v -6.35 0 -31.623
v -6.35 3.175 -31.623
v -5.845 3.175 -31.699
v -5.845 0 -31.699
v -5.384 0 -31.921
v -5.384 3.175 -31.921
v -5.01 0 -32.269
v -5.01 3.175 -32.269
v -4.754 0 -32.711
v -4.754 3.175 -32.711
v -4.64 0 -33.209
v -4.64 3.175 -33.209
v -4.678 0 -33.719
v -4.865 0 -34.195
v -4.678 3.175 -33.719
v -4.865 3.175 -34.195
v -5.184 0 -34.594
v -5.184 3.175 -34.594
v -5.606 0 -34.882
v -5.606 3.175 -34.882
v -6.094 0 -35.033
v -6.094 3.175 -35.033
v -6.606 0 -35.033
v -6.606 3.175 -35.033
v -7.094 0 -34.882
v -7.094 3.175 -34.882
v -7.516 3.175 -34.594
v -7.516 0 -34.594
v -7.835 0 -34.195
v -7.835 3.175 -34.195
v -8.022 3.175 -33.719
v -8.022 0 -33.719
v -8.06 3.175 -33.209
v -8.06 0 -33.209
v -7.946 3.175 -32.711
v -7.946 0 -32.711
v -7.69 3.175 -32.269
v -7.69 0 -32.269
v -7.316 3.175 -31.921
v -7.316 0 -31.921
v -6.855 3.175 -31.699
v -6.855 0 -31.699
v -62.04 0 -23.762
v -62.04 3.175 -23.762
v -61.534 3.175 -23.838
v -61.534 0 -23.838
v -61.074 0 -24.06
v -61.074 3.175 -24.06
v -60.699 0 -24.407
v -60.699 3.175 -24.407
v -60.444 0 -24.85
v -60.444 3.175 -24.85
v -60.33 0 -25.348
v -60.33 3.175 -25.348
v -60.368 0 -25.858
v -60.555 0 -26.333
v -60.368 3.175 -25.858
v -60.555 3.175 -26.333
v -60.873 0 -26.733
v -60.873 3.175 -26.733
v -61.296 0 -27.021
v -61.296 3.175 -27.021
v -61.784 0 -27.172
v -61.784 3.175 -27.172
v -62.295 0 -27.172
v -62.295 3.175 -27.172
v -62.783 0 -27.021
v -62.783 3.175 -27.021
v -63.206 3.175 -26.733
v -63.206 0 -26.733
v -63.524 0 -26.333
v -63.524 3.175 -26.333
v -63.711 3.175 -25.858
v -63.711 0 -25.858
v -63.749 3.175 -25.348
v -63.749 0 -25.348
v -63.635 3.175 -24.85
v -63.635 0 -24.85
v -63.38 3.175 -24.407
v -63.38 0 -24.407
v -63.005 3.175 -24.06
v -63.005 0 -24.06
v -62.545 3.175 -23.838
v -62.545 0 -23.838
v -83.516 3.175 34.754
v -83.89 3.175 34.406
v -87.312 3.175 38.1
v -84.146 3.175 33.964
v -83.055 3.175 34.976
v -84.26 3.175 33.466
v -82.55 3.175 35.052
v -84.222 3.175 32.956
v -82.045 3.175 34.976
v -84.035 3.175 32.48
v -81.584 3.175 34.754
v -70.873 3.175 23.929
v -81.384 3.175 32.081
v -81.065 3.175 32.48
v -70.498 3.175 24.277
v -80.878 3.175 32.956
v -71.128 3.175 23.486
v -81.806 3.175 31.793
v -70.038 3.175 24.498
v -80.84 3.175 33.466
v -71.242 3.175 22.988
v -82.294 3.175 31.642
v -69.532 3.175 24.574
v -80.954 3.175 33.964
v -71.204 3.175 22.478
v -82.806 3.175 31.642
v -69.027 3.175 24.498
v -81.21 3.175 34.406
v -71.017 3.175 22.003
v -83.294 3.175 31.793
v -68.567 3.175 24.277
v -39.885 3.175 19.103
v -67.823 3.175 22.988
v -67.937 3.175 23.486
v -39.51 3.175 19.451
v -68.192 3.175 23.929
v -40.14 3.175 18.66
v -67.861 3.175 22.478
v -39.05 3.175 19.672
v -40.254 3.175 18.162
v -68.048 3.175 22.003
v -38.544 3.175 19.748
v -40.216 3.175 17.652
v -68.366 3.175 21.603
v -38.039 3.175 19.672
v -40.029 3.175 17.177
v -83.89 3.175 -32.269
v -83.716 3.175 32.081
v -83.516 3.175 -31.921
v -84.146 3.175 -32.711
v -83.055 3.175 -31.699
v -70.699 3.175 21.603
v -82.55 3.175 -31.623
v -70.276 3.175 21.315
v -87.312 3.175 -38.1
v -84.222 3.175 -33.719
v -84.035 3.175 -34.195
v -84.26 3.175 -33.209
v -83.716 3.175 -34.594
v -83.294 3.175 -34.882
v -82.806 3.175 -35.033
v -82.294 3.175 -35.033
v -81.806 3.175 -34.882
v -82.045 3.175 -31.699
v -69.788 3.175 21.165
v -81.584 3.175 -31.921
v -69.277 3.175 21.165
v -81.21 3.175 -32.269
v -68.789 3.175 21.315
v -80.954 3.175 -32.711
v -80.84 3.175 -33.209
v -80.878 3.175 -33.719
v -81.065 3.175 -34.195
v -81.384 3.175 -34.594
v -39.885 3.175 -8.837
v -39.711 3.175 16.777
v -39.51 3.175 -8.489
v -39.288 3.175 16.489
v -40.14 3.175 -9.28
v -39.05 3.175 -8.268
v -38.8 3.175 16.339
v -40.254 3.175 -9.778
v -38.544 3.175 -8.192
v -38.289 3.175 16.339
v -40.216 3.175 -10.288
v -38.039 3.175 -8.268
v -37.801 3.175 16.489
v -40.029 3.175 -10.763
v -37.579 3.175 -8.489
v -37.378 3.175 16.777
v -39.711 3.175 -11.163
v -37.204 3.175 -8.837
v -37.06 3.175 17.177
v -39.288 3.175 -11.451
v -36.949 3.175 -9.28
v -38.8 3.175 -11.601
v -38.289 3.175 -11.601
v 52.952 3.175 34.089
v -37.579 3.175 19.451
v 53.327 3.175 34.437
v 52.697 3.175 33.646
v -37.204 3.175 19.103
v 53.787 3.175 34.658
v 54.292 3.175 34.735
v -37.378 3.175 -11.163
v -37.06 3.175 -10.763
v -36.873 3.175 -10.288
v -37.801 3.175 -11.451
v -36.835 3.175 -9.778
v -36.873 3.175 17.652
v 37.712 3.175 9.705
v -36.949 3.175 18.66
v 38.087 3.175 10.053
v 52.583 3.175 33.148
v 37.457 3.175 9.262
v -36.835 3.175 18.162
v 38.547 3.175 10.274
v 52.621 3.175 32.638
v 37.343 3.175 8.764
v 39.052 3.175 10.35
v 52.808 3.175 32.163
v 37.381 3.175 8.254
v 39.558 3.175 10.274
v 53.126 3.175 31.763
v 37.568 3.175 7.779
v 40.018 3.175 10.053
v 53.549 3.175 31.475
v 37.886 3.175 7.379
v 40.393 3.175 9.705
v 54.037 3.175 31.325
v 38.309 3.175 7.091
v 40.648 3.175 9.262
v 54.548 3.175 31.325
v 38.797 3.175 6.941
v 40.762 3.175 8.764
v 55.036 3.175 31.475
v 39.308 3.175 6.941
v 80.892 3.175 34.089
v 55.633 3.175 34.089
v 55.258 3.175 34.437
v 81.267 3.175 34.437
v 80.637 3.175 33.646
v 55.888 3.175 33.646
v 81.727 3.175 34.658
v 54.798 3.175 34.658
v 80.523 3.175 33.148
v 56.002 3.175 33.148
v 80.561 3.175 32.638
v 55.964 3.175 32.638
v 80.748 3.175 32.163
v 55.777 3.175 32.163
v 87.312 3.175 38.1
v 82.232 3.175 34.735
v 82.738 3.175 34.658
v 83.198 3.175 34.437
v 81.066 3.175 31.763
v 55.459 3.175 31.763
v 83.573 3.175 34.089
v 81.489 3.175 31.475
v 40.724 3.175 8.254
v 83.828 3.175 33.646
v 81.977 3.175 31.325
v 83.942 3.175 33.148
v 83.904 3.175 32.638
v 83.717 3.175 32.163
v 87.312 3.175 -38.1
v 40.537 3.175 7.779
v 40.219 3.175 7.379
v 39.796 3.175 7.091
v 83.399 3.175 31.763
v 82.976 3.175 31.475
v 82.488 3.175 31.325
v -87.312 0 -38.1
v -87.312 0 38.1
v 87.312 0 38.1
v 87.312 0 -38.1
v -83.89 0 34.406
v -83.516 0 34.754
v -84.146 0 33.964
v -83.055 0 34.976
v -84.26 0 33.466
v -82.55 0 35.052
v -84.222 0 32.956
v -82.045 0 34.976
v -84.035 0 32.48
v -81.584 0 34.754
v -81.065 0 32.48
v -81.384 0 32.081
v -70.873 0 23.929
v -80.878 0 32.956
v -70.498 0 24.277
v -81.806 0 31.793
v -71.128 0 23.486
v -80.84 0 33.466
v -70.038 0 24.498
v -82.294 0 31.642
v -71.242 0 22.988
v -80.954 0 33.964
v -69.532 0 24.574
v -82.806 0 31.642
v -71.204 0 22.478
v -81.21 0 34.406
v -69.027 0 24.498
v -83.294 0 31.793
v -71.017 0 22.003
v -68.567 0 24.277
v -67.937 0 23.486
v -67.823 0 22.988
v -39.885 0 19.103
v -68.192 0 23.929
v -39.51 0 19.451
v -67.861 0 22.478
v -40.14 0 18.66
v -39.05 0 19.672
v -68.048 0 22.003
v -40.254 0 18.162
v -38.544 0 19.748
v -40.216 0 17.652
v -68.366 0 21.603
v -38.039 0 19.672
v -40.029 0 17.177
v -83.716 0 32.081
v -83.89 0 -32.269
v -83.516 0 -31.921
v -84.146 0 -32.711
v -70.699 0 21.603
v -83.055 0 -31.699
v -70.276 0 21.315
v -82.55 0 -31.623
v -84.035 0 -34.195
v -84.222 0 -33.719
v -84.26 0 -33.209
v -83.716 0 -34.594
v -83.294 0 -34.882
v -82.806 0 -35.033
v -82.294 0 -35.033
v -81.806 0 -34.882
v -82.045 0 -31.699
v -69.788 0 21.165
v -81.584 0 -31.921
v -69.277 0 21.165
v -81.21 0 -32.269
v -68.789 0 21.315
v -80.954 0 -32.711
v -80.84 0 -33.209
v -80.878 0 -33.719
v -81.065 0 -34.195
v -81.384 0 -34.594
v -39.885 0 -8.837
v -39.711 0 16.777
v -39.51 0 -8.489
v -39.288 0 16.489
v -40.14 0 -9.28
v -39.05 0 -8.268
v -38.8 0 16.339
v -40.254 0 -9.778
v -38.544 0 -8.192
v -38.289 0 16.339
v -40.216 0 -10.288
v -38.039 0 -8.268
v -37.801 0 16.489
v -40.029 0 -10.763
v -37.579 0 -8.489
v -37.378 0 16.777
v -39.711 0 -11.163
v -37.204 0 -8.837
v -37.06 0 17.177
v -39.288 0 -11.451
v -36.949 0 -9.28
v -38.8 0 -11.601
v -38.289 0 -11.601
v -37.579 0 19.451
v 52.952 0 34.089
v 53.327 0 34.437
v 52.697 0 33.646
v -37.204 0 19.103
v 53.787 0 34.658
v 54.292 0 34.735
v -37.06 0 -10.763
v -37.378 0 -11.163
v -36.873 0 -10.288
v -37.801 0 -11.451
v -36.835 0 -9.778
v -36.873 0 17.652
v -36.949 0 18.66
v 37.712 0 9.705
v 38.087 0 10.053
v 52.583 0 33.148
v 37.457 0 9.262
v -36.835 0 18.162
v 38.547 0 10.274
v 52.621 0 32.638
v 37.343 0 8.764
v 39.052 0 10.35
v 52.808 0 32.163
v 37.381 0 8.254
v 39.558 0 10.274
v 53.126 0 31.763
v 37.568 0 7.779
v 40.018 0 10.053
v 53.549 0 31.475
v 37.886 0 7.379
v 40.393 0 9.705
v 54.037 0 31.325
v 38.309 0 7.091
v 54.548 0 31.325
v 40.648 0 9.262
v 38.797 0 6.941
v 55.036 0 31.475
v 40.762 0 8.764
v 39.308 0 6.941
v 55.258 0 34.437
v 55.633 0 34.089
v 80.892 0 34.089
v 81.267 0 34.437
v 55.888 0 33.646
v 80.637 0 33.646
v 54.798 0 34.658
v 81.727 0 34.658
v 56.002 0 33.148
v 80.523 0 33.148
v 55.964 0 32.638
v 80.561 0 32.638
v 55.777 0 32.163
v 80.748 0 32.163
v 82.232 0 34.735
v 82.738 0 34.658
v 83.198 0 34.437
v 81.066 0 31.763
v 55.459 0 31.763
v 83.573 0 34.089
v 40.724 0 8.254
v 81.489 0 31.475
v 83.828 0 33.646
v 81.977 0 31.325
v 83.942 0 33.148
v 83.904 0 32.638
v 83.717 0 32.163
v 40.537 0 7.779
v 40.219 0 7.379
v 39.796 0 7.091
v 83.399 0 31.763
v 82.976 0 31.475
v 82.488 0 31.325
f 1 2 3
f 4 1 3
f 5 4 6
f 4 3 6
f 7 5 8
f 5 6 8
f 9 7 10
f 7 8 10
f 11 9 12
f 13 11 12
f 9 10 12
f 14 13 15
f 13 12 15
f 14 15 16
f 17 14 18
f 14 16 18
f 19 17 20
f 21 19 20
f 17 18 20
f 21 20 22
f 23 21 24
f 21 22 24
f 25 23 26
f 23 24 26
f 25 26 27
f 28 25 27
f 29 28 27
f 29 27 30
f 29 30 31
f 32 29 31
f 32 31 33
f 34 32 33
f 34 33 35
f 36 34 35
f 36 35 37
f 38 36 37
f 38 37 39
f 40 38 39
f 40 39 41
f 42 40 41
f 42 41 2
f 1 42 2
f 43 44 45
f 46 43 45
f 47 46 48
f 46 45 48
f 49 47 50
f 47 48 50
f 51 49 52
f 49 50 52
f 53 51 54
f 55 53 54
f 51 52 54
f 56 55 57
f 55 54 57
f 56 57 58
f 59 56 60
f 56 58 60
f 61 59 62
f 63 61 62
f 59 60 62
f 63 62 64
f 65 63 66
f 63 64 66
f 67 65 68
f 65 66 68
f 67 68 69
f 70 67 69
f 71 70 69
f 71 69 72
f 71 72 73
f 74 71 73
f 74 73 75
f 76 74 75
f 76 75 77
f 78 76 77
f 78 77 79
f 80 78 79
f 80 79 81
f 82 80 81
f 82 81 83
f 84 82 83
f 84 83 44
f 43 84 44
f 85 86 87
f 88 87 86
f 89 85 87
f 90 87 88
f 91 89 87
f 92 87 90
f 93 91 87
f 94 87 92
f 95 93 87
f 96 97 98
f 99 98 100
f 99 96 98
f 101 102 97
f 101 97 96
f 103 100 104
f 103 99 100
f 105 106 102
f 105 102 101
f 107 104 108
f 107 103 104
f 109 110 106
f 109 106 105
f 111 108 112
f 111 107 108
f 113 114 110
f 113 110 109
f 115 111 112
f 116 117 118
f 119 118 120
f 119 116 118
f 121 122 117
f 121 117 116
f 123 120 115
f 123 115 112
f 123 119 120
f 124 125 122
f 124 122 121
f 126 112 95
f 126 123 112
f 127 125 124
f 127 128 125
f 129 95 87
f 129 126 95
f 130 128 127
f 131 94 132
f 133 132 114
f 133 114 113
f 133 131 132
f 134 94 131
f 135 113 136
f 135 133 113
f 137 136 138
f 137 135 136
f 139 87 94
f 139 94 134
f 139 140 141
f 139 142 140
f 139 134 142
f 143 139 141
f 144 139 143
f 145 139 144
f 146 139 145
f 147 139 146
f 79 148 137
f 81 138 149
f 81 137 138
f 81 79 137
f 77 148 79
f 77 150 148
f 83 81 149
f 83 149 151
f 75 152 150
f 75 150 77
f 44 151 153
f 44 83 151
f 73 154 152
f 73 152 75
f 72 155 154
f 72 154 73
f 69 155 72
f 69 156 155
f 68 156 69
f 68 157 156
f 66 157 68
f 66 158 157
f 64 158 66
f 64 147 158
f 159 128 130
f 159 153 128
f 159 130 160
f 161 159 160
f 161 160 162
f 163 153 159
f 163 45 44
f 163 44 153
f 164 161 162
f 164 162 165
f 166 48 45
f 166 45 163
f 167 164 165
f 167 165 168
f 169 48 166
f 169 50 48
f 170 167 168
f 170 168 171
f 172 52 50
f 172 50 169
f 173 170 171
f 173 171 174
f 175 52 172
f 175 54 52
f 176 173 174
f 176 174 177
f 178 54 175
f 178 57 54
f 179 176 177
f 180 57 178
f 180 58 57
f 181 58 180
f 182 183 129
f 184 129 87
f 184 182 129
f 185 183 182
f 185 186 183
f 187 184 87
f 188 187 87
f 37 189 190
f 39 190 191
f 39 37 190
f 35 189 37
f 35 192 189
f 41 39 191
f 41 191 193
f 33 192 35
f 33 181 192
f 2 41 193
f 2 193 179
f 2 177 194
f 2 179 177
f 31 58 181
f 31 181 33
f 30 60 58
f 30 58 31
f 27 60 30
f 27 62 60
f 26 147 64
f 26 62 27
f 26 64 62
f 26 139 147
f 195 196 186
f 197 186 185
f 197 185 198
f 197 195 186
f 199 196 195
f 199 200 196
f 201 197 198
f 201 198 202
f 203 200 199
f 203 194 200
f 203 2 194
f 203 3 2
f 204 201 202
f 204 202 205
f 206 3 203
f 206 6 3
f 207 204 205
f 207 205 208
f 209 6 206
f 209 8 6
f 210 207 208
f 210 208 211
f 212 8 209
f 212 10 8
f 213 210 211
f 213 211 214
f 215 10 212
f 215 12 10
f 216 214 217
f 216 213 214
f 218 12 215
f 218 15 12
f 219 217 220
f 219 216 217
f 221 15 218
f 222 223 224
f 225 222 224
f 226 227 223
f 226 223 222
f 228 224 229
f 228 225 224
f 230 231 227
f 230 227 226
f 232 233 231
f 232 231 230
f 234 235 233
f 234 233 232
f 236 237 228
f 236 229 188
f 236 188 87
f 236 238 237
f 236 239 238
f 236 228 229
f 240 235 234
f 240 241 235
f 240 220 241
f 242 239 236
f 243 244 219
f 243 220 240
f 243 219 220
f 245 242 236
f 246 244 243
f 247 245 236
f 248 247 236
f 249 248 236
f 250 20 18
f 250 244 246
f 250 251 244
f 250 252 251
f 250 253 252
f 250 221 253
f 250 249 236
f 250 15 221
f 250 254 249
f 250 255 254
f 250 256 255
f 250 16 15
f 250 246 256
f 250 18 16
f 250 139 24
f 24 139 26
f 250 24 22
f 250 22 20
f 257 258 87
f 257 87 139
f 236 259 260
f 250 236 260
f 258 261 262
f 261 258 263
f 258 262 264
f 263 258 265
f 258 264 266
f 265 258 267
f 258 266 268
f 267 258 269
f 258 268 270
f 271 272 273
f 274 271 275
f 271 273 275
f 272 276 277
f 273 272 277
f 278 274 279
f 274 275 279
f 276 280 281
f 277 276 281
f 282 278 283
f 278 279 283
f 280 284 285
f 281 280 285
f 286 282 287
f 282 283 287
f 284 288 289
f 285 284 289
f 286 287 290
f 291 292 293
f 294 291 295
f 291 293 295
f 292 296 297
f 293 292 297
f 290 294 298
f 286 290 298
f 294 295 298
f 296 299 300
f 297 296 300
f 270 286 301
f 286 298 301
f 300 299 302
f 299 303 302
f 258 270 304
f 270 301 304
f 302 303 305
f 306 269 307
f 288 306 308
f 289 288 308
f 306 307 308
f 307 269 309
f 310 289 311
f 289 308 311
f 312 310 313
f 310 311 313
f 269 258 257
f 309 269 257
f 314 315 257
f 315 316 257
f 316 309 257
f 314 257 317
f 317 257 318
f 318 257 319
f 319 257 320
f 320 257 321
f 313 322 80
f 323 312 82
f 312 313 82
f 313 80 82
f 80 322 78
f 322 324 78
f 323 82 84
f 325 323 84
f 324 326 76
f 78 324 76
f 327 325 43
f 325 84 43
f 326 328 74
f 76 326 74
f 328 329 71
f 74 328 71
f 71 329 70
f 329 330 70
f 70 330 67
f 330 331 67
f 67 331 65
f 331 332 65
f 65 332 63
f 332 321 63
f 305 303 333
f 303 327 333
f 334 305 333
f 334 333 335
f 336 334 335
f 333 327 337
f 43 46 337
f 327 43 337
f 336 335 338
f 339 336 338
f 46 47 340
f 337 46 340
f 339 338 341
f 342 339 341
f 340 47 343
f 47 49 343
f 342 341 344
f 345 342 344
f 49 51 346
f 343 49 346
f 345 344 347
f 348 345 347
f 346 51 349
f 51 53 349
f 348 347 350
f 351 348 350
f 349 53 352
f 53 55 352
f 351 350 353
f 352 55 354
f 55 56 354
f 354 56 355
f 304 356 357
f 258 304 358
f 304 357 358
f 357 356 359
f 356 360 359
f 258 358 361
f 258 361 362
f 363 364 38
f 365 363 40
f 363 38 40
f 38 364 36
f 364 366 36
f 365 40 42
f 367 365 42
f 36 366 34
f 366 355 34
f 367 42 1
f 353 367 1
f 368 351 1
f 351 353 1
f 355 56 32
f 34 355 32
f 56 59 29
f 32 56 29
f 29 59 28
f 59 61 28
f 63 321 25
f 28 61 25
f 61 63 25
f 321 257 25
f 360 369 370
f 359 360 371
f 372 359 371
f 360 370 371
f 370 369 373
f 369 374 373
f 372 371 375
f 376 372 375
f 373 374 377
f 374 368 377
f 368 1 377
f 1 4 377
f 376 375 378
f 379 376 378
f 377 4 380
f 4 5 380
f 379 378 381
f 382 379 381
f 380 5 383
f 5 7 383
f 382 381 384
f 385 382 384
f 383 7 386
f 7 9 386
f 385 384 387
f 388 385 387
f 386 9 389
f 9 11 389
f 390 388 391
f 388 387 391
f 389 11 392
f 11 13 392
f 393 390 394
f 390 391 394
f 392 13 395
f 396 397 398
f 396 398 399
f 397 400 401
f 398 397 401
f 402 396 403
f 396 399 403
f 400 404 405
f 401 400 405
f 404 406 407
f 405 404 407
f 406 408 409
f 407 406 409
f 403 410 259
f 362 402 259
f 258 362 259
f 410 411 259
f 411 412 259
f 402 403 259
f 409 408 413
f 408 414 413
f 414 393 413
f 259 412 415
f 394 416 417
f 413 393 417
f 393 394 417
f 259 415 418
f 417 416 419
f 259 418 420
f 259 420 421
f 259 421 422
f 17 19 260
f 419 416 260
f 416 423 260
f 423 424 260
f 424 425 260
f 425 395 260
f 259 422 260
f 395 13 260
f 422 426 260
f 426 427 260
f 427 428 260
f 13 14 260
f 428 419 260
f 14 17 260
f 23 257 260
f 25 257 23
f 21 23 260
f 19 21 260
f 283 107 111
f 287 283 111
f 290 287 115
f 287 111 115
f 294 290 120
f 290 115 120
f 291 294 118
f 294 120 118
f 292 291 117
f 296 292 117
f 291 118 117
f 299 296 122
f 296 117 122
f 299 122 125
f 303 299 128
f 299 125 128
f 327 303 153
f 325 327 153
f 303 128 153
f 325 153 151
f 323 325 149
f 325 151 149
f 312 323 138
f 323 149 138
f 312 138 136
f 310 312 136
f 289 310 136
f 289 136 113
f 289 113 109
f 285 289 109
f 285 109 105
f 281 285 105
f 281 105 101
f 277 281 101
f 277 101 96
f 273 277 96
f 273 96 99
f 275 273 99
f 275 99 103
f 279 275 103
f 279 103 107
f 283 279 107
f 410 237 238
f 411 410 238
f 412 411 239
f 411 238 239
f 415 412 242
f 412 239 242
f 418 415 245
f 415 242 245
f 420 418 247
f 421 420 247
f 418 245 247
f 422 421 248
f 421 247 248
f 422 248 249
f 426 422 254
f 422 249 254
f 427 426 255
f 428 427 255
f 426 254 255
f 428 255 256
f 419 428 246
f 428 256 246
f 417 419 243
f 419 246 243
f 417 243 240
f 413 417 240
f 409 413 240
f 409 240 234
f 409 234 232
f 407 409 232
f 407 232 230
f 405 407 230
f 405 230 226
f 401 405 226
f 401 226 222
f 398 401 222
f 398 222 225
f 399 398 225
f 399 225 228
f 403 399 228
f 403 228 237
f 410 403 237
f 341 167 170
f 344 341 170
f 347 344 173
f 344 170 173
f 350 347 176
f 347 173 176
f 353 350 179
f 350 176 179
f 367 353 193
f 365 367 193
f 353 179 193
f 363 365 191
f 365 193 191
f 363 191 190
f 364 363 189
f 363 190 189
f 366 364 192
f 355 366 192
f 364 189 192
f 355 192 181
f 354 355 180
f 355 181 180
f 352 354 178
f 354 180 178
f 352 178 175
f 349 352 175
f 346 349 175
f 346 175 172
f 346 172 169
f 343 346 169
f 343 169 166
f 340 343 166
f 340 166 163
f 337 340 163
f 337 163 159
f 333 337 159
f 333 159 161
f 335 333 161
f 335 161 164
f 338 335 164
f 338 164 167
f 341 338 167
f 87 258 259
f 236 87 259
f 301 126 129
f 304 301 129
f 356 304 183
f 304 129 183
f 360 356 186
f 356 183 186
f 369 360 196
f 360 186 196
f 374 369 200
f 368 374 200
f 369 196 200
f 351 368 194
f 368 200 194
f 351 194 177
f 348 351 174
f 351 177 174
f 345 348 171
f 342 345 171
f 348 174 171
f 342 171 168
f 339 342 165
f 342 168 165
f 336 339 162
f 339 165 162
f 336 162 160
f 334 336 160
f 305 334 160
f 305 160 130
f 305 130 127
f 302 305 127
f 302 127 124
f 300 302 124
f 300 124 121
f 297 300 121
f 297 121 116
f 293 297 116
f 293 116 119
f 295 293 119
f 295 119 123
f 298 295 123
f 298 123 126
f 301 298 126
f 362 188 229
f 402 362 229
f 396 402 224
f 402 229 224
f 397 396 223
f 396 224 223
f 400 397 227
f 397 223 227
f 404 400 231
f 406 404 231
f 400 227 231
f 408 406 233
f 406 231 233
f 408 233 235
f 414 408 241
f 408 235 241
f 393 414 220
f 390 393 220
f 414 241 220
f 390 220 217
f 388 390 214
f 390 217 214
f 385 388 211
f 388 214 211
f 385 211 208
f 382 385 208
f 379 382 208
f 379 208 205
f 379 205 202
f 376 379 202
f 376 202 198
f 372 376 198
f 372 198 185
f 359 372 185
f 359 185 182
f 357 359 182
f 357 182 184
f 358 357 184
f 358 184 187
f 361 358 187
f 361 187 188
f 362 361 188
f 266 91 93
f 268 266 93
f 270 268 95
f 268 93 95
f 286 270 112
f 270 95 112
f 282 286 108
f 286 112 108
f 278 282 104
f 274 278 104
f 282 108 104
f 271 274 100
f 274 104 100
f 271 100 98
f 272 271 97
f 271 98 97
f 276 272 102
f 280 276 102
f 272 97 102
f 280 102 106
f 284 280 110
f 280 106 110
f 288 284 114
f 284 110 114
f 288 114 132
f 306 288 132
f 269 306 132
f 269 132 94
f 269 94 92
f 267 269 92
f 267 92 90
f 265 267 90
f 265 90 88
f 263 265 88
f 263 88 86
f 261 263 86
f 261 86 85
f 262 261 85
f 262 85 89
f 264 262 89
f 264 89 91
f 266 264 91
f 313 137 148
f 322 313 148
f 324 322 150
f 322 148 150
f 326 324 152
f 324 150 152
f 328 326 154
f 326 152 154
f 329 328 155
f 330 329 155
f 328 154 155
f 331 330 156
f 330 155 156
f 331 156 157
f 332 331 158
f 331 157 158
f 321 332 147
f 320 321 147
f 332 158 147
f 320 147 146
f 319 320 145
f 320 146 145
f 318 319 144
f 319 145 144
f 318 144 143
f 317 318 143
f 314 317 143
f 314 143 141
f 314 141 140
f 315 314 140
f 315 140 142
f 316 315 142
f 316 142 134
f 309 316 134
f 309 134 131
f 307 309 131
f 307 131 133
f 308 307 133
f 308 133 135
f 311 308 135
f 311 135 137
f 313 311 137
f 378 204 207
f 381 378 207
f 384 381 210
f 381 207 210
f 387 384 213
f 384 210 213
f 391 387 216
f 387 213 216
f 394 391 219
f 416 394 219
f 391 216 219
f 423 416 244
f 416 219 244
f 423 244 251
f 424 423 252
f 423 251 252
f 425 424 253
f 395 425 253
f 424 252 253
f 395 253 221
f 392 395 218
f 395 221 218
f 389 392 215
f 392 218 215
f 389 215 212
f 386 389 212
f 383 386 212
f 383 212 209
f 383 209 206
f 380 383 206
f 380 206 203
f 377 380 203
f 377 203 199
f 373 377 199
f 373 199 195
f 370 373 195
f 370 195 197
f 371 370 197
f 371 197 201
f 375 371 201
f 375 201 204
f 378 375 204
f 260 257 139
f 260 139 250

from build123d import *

# Parameters (mm, degrees)
BASE_SKETCH_W                              = 174.625
BASE_SKETCH_H                              = 76.2
BASE_PLATE_DEPTH                           = 3.175
F_4_40_GUIDE_RAIL_HOLES_REACH              = 97.316
F_4_40_HOLE_PATTERN_SKETCH_GUIDE_RAIL_R    = 1.7145
F_4_40_ARDUINO_HOLES_REACH                 = 97.316
F_4_40_HOLE_PATTERN_SKETCH_ARDUINO_HOLES_R = 1.7145
F_4_40_IMU_MOUNT_HOLES_REACH               = 97.316
F_4_40_HOLE_PATTERN_SKETCH_IMU_MOUNT_R     = 1.7145


with BuildPart() as part:
    # Base Sketch → Base Plate (new body)
    with BuildSketch(Plane(origin=(0, 0, 0), x_dir=(1, 0, 0), z_dir=(0, 1, 0))):
        Rectangle(BASE_SKETCH_W, BASE_SKETCH_H)
    extrude(amount=BASE_PLATE_DEPTH)

    # 4-40 Hole Pattern Sketch (Guide Rail) → 4-40 Guide Rail Holes (cut, up to next)
    with BuildSketch(Plane(origin=(0, 3.175, 0), x_dir=(1, 0, 0), z_dir=(0, 1, 0)), mode=Mode.PRIVATE) as f_4_40_guide_rail_holes_sk1:
        with Locations(Location((-82.55, 33.3375, 0), (0, 0, 270))):
            Circle(F_4_40_HOLE_PATTERN_SKETCH_GUIDE_RAIL_R)
    f_4_40_guide_rail_holes_tool1 = extrude(f_4_40_guide_rail_holes_sk1.sketch, amount=-F_4_40_GUIDE_RAIL_HOLES_REACH, mode=Mode.PRIVATE) & part.part
    # 4-40 Hole Pattern Sketch (Guide Rail) → 4-40 Guide Rail Holes (cut, up to next)
    with BuildSketch(Plane(origin=(0, 3.175, 0), x_dir=(1, 0, 0), z_dir=(0, 1, 0)), mode=Mode.PRIVATE) as f_4_40_guide_rail_holes_sk2:
        with Locations(Location((-82.55, -33.3375, 0), (0, 0, 270))):
            Circle(F_4_40_HOLE_PATTERN_SKETCH_GUIDE_RAIL_R)
    f_4_40_guide_rail_holes_tool2 = extrude(f_4_40_guide_rail_holes_sk2.sketch, amount=-F_4_40_GUIDE_RAIL_HOLES_REACH, mode=Mode.PRIVATE) & part.part
    # 4-40 Hole Pattern Sketch (Guide Rail) → 4-40 Guide Rail Holes (cut, up to next)
    with BuildSketch(Plane(origin=(0, 3.175, 0), x_dir=(1, 0, 0), z_dir=(0, 1, 0)), mode=Mode.PRIVATE) as f_4_40_guide_rail_holes_sk3:
        with Locations(Location((-6.35, 33.3375, 0), (0, 0, 270))):
            Circle(F_4_40_HOLE_PATTERN_SKETCH_GUIDE_RAIL_R)
    f_4_40_guide_rail_holes_tool3 = extrude(f_4_40_guide_rail_holes_sk3.sketch, amount=-F_4_40_GUIDE_RAIL_HOLES_REACH, mode=Mode.PRIVATE) & part.part
    add(f_4_40_guide_rail_holes_tool1.solids().sort_by_distance((-82.55, 3.175, -33.3375))[0], mode=Mode.SUBTRACT)
    add(f_4_40_guide_rail_holes_tool2.solids().sort_by_distance((-82.55, 3.175, 33.3375))[0], mode=Mode.SUBTRACT)
    add(f_4_40_guide_rail_holes_tool3.solids().sort_by_distance((-6.35, 3.175, -33.3375))[0], mode=Mode.SUBTRACT)

    # 4-40 Hole Pattern Sketch (Arduino Holes) → 4-40 Arduino Holes (cut, up to next)
    with BuildSketch(Plane(origin=(0, 3.175, 0), x_dir=(1, 0, 0), z_dir=(0, 1, 0)), mode=Mode.PRIVATE) as f_4_40_arduino_holes_sk1:
        with Locations(Location((-38.5445, -18.034, 0), (0, 0, 270))):
            Circle(F_4_40_HOLE_PATTERN_SKETCH_ARDUINO_HOLES_R)
    f_4_40_arduino_holes_tool1 = extrude(f_4_40_arduino_holes_sk1.sketch, amount=-F_4_40_ARDUINO_HOLES_REACH, mode=Mode.PRIVATE) & part.part
    # 4-40 Hole Pattern Sketch (Arduino Holes) → 4-40 Arduino Holes (cut, up to next)
    with BuildSketch(Plane(origin=(0, 3.175, 0), x_dir=(1, 0, 0), z_dir=(0, 1, 0)), mode=Mode.PRIVATE) as f_4_40_arduino_holes_sk2:
        with Locations(Location((-38.5445, 9.906, 0), (0, 0, 270))):
            Circle(F_4_40_HOLE_PATTERN_SKETCH_ARDUINO_HOLES_R)
    f_4_40_arduino_holes_tool2 = extrude(f_4_40_arduino_holes_sk2.sketch, amount=-F_4_40_ARDUINO_HOLES_REACH, mode=Mode.PRIVATE) & part.part
    # 4-40 Hole Pattern Sketch (Arduino Holes) → 4-40 Arduino Holes (cut, up to next)
    with BuildSketch(Plane(origin=(0, 3.175, 0), x_dir=(1, 0, 0), z_dir=(0, 1, 0)), mode=Mode.PRIVATE) as f_4_40_arduino_holes_sk3:
        with Locations(Location((-69.5325, -22.86, 0), (0, 0, 270))):
            Circle(F_4_40_HOLE_PATTERN_SKETCH_ARDUINO_HOLES_R)
    f_4_40_arduino_holes_tool3 = extrude(f_4_40_arduino_holes_sk3.sketch, amount=-F_4_40_ARDUINO_HOLES_REACH, mode=Mode.PRIVATE) & part.part
    # 4-40 Hole Pattern Sketch (Arduino Holes) → 4-40 Arduino Holes (cut, up to next)
    with BuildSketch(Plane(origin=(0, 3.175, 0), x_dir=(1, 0, 0), z_dir=(0, 1, 0)), mode=Mode.PRIVATE) as f_4_40_arduino_holes_sk4:
        with Locations(Location((-62.0395, 25.4762, 0), (0, 0, 270))):
            Circle(F_4_40_HOLE_PATTERN_SKETCH_ARDUINO_HOLES_R)
    f_4_40_arduino_holes_tool4 = extrude(f_4_40_arduino_holes_sk4.sketch, amount=-F_4_40_ARDUINO_HOLES_REACH, mode=Mode.PRIVATE) & part.part
    add(f_4_40_arduino_holes_tool1.solids().sort_by_distance((-38.5445, 3.175, 18.034))[0], mode=Mode.SUBTRACT)
    add(f_4_40_arduino_holes_tool2.solids().sort_by_distance((-38.5445, 3.175, -9.906))[0], mode=Mode.SUBTRACT)
    add(f_4_40_arduino_holes_tool3.solids().sort_by_distance((-69.5325, 3.175, 22.86))[0], mode=Mode.SUBTRACT)
    add(f_4_40_arduino_holes_tool4.solids().sort_by_distance((-62.0395, 3.175, -25.4762))[0], mode=Mode.SUBTRACT)

    # 4-40 Hole Pattern Sketch (IMU Mount) → 4-40 IMU Mount Holes (cut, up to next)
    with BuildSketch(Plane(origin=(0, 3.175, 0), x_dir=(1, 0, 0), z_dir=(0, 1, 0)), mode=Mode.PRIVATE) as f_4_40_imu_mount_holes_sk1:
        with Locations(Location((82.2325, -33.02, 0), (0, 0, 270))):
            Circle(F_4_40_HOLE_PATTERN_SKETCH_IMU_MOUNT_R)
    f_4_40_imu_mount_holes_tool1 = extrude(f_4_40_imu_mount_holes_sk1.sketch, amount=-F_4_40_IMU_MOUNT_HOLES_REACH, mode=Mode.PRIVATE) & part.part
    # 4-40 Hole Pattern Sketch (IMU Mount) → 4-40 IMU Mount Holes (cut, up to next)
    with BuildSketch(Plane(origin=(0, 3.175, 0), x_dir=(1, 0, 0), z_dir=(0, 1, 0)), mode=Mode.PRIVATE) as f_4_40_imu_mount_holes_sk2:
        with Locations(Location((54.2925, -33.02, 0), (0, 0, 270))):
            Circle(F_4_40_HOLE_PATTERN_SKETCH_IMU_MOUNT_R)
    f_4_40_imu_mount_holes_tool2 = extrude(f_4_40_imu_mount_holes_sk2.sketch, amount=-F_4_40_IMU_MOUNT_HOLES_REACH, mode=Mode.PRIVATE) & part.part
    # 4-40 Hole Pattern Sketch (IMU Mount) → 4-40 IMU Mount Holes (cut, up to next)
    with BuildSketch(Plane(origin=(0, 3.175, 0), x_dir=(1, 0, 0), z_dir=(0, 1, 0)), mode=Mode.PRIVATE) as f_4_40_imu_mount_holes_sk3:
        with Locations(Location((39.0525, -8.636, 0), (0, 0, 270))):
            Circle(F_4_40_HOLE_PATTERN_SKETCH_IMU_MOUNT_R)
    f_4_40_imu_mount_holes_tool3 = extrude(f_4_40_imu_mount_holes_sk3.sketch, amount=-F_4_40_IMU_MOUNT_HOLES_REACH, mode=Mode.PRIVATE) & part.part
    add(f_4_40_imu_mount_holes_tool1.solids().sort_by_distance((82.2325, 3.175, 33.02))[0], mode=Mode.SUBTRACT)
    add(f_4_40_imu_mount_holes_tool2.solids().sort_by_distance((54.2925, 3.175, 33.02))[0], mode=Mode.SUBTRACT)
    add(f_4_40_imu_mount_holes_tool3.solids().sort_by_distance((39.0525, 3.175, 8.636))[0], mode=Mode.SUBTRACT)


solid = part.part
